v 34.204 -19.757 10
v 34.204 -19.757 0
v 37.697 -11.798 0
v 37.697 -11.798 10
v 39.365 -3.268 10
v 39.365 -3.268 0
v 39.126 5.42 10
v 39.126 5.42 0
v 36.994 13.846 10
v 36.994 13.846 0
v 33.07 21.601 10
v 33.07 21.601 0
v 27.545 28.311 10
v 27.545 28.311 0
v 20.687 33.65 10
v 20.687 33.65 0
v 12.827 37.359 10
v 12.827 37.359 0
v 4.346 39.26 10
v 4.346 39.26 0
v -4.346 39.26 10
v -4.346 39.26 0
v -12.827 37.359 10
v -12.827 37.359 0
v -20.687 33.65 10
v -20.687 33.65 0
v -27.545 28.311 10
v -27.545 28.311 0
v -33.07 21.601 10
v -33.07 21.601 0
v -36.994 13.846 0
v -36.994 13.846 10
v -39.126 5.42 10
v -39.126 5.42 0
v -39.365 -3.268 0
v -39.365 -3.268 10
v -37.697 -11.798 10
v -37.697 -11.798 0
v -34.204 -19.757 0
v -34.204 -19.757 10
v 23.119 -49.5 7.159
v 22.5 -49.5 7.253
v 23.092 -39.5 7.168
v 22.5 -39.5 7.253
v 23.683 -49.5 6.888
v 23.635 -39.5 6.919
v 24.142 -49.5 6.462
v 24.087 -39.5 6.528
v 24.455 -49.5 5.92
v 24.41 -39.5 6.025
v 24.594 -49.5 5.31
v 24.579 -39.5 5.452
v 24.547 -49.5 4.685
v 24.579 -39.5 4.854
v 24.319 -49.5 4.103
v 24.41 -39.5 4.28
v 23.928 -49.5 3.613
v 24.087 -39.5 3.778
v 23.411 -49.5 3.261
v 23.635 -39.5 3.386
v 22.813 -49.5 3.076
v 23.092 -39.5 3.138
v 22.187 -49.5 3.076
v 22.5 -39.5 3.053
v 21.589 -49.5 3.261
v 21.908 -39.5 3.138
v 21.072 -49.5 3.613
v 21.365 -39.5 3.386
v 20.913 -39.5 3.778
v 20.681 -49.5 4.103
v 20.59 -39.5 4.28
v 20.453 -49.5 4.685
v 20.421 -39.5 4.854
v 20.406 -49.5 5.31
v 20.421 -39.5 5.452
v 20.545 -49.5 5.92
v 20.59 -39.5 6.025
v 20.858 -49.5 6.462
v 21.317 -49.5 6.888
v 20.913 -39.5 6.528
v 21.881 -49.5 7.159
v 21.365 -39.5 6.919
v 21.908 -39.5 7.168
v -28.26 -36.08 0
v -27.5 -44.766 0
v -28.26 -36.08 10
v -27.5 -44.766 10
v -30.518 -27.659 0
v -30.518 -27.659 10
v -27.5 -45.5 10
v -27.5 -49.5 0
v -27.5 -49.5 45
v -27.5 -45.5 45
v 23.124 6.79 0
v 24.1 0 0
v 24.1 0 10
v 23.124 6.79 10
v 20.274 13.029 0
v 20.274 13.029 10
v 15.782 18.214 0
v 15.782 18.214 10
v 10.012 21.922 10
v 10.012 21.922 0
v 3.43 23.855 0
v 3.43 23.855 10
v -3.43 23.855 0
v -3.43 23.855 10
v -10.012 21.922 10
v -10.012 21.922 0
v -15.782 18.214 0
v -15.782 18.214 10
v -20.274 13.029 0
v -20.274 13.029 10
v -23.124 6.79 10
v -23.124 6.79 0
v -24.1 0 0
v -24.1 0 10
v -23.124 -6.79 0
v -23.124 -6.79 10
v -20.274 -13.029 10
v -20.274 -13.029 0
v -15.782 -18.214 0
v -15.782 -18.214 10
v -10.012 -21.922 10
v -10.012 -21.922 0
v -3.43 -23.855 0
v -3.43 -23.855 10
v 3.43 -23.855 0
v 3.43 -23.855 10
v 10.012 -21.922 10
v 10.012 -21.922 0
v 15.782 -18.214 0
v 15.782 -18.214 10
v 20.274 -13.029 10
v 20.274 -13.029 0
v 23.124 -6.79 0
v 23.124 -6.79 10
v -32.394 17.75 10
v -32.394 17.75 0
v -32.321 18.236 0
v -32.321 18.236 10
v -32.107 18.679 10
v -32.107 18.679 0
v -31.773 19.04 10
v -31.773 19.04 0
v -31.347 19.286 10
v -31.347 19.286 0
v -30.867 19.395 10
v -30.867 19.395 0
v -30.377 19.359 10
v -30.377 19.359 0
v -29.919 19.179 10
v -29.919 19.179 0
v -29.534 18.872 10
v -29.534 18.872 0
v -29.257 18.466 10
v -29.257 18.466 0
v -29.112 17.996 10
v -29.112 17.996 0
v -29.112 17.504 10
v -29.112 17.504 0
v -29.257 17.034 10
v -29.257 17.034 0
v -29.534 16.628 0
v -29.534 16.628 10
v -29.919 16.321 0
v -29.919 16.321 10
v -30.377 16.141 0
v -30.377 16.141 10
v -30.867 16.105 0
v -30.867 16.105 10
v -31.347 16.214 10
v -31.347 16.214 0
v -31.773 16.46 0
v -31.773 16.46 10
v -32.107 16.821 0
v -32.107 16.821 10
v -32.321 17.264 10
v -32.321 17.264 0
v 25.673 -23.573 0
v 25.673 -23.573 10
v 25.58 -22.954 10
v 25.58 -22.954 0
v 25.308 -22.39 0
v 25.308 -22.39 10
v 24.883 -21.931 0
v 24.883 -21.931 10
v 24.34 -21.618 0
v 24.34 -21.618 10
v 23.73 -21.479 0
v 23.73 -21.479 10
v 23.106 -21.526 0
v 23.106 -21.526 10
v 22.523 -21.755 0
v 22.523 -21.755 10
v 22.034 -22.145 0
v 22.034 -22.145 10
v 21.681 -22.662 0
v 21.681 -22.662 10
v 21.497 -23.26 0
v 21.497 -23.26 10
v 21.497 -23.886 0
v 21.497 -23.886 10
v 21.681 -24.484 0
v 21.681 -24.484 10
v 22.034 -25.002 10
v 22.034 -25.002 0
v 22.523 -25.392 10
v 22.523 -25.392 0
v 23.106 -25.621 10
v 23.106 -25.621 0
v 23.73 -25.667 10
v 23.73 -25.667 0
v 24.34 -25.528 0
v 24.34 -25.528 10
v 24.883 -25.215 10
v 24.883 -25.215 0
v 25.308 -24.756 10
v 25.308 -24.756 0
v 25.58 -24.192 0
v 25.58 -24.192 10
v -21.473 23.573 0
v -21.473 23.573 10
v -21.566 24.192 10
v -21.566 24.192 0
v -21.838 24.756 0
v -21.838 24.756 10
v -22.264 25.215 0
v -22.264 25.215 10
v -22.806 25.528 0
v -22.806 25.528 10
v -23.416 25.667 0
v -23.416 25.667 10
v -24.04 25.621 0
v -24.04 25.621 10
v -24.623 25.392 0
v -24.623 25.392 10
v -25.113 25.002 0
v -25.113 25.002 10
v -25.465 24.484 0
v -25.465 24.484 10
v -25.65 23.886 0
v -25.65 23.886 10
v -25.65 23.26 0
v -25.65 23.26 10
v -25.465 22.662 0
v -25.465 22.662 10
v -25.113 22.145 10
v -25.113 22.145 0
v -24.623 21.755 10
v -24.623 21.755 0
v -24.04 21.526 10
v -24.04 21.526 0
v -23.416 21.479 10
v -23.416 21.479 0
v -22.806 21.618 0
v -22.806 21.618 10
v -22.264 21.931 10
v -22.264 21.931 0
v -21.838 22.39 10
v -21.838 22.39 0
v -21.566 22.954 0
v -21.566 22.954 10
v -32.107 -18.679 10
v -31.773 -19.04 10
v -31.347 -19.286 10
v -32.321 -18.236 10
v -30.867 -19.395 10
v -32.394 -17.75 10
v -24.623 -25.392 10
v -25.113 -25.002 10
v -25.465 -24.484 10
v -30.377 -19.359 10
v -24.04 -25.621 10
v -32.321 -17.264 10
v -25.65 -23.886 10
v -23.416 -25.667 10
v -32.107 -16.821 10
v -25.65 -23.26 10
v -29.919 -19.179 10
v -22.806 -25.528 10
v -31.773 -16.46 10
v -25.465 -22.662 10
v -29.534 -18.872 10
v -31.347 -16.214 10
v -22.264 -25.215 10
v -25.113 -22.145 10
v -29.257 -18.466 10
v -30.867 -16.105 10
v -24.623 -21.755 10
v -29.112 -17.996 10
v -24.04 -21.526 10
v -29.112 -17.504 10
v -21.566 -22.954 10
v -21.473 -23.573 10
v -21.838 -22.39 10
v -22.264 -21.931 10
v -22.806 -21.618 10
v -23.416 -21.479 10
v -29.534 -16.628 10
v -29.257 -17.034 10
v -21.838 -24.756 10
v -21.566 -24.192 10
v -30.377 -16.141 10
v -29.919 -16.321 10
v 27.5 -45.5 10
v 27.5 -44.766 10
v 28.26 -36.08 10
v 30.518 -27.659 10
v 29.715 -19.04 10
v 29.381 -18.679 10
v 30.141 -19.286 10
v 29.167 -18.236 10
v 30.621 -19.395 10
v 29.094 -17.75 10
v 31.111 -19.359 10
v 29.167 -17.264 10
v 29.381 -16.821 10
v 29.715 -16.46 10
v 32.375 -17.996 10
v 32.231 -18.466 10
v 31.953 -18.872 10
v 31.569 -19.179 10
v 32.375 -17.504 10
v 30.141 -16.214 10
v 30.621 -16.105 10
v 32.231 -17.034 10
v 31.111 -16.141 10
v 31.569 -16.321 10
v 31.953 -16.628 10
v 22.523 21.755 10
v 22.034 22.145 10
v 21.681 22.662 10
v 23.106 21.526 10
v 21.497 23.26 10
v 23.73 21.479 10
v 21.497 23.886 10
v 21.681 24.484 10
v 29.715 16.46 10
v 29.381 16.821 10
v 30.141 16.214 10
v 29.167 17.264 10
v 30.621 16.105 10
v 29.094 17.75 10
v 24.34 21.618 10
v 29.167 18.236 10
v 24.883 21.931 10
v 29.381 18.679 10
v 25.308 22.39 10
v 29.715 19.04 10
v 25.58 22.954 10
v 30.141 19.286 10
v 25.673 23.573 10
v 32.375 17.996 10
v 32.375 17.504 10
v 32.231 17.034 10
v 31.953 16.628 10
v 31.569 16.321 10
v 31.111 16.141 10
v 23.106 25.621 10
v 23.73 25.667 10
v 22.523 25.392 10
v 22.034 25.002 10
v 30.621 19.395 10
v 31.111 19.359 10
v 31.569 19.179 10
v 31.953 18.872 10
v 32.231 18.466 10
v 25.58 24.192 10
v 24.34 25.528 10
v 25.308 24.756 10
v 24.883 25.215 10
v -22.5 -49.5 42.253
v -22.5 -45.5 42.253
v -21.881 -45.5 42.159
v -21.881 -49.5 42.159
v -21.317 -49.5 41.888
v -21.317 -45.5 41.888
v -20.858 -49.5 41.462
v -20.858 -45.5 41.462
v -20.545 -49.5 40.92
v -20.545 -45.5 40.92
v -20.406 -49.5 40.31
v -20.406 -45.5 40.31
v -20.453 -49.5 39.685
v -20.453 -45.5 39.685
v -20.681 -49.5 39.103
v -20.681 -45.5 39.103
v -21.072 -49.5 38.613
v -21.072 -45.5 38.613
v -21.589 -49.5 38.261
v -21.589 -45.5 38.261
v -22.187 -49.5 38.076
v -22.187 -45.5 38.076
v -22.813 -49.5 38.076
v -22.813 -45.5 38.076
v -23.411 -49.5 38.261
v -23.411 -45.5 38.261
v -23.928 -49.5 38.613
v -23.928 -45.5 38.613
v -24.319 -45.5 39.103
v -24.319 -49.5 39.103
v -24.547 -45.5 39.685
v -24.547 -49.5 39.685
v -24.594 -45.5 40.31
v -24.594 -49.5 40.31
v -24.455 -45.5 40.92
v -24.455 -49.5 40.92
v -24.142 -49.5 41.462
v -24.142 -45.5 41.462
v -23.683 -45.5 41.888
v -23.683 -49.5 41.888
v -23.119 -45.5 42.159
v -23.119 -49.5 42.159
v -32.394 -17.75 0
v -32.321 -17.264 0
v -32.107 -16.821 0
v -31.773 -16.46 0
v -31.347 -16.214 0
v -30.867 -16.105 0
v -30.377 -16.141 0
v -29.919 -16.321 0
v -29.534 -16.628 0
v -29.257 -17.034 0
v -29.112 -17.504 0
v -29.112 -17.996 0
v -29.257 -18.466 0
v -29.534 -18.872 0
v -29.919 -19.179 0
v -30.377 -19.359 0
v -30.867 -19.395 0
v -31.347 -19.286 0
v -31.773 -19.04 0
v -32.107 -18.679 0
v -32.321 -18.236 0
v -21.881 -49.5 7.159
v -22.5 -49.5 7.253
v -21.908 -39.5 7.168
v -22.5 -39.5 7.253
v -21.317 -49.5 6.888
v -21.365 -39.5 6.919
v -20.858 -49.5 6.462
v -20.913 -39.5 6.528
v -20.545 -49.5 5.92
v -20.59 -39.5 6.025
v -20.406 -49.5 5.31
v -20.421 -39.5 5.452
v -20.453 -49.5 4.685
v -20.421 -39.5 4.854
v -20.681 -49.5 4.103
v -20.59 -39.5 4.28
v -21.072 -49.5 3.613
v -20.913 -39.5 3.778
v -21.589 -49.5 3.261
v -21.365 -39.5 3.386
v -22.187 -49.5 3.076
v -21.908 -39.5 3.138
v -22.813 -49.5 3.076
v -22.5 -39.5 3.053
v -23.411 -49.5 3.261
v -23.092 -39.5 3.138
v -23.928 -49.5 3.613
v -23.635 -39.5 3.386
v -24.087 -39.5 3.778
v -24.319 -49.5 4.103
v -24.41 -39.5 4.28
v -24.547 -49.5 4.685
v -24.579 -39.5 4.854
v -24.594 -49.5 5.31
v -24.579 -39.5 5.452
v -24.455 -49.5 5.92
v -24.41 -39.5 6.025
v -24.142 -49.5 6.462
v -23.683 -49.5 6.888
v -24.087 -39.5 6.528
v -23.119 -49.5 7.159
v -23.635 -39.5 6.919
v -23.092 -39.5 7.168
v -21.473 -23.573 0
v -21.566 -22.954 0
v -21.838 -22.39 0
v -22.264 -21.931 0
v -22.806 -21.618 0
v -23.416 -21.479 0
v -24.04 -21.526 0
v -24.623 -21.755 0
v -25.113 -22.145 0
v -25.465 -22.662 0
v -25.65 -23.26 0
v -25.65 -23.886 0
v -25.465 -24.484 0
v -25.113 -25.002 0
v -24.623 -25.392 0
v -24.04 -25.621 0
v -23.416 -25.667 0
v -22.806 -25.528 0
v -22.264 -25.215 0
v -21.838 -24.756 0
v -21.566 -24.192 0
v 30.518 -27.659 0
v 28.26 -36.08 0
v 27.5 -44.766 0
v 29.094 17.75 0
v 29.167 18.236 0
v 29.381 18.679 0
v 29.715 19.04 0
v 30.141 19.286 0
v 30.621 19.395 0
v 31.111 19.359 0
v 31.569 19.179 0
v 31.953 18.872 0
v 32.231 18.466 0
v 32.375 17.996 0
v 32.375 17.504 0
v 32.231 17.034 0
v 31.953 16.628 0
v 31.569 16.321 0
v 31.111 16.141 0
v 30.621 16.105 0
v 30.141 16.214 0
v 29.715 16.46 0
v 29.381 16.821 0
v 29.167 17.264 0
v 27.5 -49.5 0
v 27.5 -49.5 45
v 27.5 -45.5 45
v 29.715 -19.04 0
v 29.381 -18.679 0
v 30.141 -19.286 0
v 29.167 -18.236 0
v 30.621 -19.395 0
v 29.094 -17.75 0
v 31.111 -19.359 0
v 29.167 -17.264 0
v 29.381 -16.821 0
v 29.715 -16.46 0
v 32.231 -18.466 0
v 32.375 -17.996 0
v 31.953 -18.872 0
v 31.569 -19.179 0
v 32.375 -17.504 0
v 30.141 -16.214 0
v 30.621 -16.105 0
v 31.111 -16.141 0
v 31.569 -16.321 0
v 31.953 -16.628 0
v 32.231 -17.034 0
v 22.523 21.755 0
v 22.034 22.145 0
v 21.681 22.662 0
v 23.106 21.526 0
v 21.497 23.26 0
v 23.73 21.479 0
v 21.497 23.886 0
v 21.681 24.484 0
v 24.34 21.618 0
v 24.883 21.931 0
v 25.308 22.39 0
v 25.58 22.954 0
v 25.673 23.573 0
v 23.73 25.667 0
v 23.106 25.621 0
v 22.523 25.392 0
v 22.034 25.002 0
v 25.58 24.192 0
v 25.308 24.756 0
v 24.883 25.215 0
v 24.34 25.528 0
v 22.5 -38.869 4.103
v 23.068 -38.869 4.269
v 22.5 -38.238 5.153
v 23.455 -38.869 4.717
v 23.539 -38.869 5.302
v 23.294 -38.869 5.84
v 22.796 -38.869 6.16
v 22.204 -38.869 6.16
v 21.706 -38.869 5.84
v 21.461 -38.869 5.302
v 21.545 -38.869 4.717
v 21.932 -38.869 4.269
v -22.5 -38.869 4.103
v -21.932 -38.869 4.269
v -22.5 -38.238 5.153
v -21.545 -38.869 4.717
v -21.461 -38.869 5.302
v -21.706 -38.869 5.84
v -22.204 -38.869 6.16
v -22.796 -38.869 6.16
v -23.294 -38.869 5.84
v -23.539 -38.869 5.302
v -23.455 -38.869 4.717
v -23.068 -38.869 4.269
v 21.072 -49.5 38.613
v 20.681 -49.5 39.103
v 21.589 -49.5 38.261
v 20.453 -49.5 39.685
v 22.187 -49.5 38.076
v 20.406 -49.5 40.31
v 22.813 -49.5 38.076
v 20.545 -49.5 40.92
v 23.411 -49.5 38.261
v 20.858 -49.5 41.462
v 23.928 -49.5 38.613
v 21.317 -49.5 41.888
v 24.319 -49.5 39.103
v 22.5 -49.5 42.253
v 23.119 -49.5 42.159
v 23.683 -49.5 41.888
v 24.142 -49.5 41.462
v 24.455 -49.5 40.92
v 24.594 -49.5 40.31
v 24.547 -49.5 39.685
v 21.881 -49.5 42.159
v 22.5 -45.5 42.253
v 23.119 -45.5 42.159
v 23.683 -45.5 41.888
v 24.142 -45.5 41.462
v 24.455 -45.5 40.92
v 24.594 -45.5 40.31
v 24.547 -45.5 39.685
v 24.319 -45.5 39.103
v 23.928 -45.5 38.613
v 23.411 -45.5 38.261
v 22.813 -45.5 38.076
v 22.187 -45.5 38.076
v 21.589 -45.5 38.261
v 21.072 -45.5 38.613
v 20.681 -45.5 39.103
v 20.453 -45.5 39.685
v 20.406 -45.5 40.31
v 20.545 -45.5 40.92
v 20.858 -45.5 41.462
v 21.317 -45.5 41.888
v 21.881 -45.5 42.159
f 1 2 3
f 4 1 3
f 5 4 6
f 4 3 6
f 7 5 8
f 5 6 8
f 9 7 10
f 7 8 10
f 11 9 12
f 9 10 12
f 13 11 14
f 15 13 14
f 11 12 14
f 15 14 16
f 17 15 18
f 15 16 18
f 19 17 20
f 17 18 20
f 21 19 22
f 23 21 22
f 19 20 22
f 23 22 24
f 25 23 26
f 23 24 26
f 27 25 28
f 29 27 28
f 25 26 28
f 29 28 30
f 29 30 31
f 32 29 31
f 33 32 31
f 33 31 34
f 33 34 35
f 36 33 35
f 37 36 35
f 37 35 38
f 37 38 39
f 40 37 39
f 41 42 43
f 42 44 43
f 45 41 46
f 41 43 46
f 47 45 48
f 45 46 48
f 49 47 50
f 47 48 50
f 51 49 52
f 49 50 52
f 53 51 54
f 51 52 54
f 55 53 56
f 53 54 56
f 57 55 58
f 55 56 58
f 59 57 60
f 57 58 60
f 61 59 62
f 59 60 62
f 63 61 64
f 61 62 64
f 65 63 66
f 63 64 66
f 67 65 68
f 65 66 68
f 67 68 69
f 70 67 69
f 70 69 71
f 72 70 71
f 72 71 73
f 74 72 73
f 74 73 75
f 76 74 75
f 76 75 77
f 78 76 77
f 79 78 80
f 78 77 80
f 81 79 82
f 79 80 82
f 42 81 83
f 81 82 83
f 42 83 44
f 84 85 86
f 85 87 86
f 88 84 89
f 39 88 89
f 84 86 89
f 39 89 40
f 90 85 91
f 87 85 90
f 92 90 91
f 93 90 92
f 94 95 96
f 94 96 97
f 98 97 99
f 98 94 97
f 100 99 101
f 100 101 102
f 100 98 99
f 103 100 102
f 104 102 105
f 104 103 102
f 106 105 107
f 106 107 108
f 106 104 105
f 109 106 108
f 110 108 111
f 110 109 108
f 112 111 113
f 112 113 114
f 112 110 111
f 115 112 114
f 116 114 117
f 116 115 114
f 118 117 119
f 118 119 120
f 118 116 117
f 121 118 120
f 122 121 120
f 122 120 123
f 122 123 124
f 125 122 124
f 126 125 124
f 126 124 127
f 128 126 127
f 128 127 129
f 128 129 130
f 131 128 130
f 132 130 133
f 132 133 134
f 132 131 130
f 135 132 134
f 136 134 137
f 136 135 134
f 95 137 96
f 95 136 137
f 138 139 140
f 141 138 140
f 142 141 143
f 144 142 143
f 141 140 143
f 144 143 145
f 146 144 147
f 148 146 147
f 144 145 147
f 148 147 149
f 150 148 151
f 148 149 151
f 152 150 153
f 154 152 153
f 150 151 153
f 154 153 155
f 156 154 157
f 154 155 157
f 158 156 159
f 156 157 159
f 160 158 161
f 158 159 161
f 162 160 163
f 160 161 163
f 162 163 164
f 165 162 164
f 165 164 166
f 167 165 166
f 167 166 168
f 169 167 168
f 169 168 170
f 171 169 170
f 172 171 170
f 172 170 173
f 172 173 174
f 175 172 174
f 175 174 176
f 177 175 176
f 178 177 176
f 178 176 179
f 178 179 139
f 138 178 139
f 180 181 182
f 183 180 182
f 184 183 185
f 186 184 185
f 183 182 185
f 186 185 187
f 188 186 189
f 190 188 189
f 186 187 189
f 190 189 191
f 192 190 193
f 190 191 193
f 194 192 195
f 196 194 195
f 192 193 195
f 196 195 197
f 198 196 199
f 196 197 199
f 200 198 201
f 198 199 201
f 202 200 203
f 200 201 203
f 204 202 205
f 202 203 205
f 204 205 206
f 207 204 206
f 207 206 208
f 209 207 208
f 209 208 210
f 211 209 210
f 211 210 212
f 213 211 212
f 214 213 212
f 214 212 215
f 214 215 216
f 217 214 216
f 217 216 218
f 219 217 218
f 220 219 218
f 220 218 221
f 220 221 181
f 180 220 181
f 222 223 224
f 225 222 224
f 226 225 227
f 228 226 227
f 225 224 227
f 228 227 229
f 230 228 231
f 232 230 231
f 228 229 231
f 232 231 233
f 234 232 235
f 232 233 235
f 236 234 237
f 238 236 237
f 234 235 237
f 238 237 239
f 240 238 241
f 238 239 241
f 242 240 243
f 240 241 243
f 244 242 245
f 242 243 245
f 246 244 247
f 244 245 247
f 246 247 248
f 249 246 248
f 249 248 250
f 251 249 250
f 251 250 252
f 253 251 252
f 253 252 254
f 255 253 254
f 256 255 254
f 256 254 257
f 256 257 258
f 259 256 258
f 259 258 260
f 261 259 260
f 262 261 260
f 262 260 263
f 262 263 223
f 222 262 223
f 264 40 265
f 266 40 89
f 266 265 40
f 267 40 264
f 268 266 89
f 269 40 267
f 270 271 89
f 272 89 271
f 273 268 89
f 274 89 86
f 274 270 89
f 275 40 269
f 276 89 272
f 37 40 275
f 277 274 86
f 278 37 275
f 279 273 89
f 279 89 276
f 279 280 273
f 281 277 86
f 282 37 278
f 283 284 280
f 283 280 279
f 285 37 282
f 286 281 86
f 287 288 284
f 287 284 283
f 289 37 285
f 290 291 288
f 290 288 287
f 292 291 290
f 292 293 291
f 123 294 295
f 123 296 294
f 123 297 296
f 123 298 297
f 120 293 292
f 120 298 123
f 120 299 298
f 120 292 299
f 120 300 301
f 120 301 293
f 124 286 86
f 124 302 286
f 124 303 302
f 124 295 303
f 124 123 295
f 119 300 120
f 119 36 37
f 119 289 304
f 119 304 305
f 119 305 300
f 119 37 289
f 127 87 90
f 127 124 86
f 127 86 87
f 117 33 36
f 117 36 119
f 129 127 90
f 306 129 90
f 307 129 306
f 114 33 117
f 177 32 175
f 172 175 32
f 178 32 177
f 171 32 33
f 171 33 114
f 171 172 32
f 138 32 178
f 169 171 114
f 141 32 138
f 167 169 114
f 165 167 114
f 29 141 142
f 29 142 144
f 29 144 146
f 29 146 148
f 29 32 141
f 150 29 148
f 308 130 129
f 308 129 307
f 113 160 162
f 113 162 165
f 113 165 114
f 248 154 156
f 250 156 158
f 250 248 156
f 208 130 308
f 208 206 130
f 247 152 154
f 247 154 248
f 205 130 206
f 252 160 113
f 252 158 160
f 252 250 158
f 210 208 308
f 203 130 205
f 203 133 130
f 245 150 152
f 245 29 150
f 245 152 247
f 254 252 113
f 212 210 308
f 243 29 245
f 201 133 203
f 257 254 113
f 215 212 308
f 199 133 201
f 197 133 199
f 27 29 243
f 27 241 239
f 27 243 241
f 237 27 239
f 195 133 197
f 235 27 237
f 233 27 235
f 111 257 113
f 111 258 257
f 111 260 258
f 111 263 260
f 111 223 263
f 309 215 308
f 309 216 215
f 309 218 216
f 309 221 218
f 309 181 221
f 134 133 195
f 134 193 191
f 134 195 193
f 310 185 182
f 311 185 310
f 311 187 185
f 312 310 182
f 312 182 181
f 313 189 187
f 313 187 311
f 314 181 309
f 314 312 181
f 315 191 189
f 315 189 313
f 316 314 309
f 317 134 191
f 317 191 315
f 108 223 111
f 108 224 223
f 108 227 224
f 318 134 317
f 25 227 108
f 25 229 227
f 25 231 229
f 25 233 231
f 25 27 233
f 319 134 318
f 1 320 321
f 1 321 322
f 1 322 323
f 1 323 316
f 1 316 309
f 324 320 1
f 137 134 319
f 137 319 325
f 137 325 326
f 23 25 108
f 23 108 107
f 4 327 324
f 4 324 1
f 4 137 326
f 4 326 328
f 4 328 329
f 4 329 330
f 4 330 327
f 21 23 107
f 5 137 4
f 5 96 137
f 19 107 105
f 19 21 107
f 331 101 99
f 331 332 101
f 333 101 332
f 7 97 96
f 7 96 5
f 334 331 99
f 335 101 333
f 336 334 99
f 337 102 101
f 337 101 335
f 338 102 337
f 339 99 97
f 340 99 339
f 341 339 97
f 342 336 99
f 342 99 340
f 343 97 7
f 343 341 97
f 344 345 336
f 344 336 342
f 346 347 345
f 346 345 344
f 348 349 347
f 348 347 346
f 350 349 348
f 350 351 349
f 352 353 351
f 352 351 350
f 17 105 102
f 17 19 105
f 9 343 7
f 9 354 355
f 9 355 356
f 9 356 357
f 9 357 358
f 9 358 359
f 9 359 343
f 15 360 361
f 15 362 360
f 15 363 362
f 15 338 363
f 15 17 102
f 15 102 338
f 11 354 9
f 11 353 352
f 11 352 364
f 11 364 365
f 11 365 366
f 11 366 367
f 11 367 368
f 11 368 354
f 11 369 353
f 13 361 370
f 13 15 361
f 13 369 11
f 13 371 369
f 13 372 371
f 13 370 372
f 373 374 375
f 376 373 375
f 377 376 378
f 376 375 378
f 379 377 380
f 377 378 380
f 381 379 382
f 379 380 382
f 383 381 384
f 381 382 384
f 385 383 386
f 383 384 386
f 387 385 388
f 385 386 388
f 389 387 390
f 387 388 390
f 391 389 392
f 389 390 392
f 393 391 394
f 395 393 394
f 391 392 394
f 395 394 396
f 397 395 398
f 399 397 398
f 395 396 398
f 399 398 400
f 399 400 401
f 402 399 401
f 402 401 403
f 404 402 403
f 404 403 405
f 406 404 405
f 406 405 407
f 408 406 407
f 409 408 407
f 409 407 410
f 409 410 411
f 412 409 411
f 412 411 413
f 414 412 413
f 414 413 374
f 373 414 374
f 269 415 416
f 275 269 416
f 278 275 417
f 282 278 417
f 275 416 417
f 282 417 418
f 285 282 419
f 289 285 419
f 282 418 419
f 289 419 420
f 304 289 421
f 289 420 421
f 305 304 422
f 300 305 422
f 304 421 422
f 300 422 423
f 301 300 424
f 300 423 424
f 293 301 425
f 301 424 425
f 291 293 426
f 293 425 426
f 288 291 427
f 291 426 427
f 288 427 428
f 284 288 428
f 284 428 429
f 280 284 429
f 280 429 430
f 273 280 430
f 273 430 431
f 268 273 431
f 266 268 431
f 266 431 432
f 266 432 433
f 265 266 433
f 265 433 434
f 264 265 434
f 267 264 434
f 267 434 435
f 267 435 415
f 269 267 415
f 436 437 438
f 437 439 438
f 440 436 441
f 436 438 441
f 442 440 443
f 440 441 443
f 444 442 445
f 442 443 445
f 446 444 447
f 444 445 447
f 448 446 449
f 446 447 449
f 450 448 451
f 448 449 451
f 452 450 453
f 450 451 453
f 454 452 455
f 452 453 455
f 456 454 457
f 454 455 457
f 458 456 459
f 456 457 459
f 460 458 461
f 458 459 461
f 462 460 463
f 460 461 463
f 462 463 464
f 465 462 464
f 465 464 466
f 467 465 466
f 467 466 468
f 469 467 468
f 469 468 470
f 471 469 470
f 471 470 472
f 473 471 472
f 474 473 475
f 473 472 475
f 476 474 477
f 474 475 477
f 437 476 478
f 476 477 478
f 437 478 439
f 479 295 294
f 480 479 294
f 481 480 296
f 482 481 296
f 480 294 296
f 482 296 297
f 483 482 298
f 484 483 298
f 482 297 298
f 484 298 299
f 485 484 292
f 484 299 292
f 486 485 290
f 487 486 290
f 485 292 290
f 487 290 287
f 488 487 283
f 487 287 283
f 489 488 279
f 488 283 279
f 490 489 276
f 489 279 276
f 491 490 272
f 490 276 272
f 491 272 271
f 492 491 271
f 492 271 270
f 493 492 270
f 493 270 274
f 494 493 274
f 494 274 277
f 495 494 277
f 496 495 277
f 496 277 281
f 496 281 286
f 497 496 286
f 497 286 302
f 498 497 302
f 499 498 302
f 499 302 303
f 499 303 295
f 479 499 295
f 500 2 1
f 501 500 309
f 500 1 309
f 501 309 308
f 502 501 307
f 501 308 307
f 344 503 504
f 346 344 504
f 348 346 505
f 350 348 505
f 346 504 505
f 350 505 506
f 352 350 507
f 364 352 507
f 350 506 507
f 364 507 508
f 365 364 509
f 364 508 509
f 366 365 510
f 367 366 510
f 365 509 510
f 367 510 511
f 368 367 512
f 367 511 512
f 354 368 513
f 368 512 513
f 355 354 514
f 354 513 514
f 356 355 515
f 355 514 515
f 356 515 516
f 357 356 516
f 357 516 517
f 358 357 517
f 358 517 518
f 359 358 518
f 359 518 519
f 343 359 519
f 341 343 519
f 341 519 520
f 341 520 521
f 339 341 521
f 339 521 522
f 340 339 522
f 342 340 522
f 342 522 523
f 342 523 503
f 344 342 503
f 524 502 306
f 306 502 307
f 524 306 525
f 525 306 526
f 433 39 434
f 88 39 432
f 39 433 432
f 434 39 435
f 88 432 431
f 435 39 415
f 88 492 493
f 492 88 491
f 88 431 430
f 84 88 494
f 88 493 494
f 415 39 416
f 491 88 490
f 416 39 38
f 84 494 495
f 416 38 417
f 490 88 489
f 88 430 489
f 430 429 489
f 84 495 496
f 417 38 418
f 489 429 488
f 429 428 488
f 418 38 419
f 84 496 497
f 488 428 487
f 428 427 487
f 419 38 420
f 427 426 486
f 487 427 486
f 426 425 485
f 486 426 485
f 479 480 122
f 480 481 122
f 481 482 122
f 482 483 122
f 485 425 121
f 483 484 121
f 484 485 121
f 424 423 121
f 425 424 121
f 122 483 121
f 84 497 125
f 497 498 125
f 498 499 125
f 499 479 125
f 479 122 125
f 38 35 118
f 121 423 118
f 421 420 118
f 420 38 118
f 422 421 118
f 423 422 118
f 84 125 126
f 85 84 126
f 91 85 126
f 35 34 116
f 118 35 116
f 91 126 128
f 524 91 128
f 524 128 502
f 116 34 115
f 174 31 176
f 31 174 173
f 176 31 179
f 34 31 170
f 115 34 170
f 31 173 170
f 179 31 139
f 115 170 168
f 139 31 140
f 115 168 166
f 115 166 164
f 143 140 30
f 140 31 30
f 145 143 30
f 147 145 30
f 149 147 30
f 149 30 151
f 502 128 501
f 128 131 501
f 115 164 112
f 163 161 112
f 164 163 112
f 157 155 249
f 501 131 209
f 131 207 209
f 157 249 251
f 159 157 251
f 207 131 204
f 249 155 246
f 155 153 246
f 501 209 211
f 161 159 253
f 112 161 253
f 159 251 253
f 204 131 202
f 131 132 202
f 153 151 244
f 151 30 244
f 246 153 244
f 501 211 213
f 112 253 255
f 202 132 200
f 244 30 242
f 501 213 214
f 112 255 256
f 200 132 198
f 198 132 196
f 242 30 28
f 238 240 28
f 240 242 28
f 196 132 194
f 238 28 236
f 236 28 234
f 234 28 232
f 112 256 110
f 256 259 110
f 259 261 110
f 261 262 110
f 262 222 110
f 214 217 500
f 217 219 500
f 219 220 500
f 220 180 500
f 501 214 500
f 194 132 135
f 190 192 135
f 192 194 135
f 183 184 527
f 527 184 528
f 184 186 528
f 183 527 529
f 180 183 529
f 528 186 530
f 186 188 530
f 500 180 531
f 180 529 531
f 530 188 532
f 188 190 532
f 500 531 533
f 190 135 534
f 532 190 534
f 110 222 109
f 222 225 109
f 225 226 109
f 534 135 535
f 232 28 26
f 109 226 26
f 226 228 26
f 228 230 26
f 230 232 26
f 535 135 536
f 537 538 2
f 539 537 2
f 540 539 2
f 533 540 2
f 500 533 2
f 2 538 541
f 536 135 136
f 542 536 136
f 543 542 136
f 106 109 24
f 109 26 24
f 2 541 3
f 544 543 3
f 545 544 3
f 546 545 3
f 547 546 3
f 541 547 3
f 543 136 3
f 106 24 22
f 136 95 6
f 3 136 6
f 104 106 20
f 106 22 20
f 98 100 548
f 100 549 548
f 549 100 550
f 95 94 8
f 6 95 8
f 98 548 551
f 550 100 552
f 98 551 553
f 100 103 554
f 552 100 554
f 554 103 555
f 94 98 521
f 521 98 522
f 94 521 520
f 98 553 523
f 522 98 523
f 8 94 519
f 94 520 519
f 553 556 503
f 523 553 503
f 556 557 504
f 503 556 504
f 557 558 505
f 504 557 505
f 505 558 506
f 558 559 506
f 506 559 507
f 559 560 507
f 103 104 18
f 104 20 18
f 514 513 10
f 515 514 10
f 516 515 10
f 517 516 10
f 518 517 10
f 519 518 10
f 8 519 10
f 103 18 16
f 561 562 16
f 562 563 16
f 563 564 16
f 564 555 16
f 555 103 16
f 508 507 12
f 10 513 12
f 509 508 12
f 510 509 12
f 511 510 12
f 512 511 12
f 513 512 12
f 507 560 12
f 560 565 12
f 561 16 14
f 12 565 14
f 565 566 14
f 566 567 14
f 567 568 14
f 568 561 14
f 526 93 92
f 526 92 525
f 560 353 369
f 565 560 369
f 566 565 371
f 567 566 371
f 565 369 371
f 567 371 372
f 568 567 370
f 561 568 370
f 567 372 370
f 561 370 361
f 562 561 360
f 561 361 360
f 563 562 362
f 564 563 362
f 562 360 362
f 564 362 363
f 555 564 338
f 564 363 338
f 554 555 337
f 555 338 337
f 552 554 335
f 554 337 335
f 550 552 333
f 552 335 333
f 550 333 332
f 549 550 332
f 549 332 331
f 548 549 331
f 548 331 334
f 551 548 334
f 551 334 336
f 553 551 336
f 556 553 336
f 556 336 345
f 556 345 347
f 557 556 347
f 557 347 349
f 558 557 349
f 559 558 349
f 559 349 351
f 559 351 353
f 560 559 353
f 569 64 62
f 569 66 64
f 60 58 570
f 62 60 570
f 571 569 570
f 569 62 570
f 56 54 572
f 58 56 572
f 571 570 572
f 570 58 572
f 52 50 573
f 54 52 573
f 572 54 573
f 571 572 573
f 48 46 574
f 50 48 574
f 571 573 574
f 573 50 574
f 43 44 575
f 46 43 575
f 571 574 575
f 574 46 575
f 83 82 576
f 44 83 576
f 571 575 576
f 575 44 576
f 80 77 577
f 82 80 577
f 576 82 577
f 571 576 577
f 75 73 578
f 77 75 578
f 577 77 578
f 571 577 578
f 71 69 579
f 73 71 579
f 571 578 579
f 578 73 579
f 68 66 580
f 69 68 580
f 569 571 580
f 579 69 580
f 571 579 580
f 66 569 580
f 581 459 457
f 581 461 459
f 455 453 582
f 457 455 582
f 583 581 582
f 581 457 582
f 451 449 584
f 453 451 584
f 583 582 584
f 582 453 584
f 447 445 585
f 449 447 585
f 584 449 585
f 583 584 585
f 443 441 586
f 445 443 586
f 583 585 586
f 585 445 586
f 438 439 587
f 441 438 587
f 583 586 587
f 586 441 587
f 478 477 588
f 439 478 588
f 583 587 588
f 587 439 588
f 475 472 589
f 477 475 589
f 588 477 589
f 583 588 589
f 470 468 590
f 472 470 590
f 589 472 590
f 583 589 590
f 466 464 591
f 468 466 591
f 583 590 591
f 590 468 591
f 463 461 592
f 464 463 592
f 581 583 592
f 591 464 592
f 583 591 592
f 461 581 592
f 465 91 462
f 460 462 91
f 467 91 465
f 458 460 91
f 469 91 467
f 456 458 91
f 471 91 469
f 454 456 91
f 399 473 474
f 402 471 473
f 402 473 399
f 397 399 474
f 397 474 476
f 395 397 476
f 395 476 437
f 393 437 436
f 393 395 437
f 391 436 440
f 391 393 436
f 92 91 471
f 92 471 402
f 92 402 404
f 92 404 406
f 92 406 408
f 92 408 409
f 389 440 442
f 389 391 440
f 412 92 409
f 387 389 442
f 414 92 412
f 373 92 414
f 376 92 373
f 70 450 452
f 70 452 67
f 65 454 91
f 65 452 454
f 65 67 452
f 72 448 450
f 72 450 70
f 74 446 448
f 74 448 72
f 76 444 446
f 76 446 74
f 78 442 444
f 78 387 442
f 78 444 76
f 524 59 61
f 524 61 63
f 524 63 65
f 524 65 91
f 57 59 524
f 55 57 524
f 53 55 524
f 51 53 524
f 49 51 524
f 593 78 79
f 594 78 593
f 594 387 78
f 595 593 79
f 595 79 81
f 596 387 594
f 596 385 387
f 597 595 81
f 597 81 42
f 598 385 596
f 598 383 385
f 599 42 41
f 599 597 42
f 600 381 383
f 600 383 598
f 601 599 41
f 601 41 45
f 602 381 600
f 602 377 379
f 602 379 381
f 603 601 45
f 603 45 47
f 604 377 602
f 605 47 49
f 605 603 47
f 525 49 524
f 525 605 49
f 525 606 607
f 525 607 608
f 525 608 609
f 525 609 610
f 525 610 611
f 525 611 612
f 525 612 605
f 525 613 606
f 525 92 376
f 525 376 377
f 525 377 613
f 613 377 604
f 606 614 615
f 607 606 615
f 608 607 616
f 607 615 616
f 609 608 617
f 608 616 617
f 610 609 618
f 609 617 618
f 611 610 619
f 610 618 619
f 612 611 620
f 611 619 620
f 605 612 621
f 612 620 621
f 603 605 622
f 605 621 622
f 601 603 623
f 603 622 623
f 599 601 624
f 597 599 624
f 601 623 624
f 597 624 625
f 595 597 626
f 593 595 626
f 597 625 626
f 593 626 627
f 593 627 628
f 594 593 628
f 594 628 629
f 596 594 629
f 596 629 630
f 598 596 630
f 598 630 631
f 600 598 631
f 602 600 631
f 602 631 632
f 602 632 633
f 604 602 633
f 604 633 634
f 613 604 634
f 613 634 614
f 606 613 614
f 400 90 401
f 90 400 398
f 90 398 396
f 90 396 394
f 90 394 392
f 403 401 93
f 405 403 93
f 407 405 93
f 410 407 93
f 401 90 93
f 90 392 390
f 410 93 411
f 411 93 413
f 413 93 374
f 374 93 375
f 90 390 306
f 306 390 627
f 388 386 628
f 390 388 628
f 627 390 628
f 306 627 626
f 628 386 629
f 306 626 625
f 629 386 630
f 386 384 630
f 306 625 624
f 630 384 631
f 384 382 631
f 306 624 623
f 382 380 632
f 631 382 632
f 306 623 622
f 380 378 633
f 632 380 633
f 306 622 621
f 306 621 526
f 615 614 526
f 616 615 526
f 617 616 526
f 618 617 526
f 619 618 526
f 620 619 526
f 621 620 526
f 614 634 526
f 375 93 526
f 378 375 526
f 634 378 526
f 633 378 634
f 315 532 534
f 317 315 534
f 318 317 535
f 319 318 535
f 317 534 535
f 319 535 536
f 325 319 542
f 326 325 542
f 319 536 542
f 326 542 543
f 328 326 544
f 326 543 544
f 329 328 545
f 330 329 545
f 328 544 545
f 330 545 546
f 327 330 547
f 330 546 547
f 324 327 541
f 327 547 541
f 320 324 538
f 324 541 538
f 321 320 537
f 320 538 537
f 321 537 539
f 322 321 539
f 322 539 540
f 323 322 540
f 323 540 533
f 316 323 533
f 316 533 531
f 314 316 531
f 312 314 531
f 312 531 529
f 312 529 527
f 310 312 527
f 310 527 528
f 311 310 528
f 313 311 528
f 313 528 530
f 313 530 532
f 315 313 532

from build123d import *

# Parameters (mm, degrees)
SKETCH1_R                       = 24.1
BOSS_EXTRUDE1_DEPTH             = 10
TAP_DRILL_FOR_M5X0_8_TAP1_D     = 4.2
TAP_DRILL_FOR_M4X0_7_TAP1_D     = 3.3
SKETCH9_W                       = 55
SKETCH9_H                       = 45
BOSS_EXTRUDE2_DEPTH             = 4
TAP_DRILL_FOR_M5X0_8_TAP2_D     = 4.2
TAP_DRILL_FOR_M5X0_8_TAP2_DEPTH = 10
TAP_DRILL_FOR_M5X0_8_TAP2_TIP   = 1.2618073
FILLET1_R                       = 50


with BuildPart() as part:
    # Sketch1 → Boss-Extrude1 (new body)
    with BuildSketch(Plane.XY):
        with BuildLine():
            Line((-27.5, -28.354893758), (-27.5, -45.5))
            Line((-27.5, -45.5), (27.5, -45.5))
            Line((27.5, -45.5), (27.5, -28.354893758))
            ThreePointArc((27.5, -28.354893758), (0, 39.5), (-27.5, -28.354893758))
        make_face()
        Circle(SKETCH1_R, mode=Mode.SUBTRACT)
    extrude(amount=BOSS_EXTRUDE1_DEPTH)

    # Tap Drill for M5x0.8 Tap1 (through all)
    with Locations(Plane(origin=(23.573172318, 23.573172318, 0), x_dir=(-1, 0, 0), z_dir=(0, 0, -1))):
        with Locations((0, 0), (47.146344636, 0), (47.146344636, -47.146344636), (0, -47.146344636)):
            Hole(TAP_DRILL_FOR_M5X0_8_TAP1_D / 2)

    # Tap Drill for M4x0.7 Tap1 (through all)
    with Locations(Plane(origin=(-30.743901834, -17.75, 10), x_dir=(1, 0, 0), z_dir=(0, 0, 1))):
        with Locations((0, 0), (0, 35.5), (61.487803668, 35.5), (61.487803668, 0)):
            Hole(TAP_DRILL_FOR_M4X0_7_TAP1_D / 2)

    # Sketch9 → Boss-Extrude2 (add)
    with BuildSketch(Plane.XZ.offset(45.5)):
        with Locations((0, 22.5)):
            Rectangle(SKETCH9_W, SKETCH9_H)
    extrude(amount=BOSS_EXTRUDE2_DEPTH)

    # Tap Drill for M5x0.8 Tap2
    with Locations(Plane(origin=(-22.5, -49.5, 40.15274255), x_dir=(0, 0, -1), z_dir=(0, -1, 0))):
        with Locations((0, 0), (0, 45), (35, 45), (35, 0)):
            Hole(TAP_DRILL_FOR_M5X0_8_TAP2_D / 2, depth=TAP_DRILL_FOR_M5X0_8_TAP2_DEPTH)
            with Locations((0, 0, -(TAP_DRILL_FOR_M5X0_8_TAP2_DEPTH + TAP_DRILL_FOR_M5X0_8_TAP2_TIP / 2))):  # 118° drill point
                Cone(0, TAP_DRILL_FOR_M5X0_8_TAP2_D / 2, TAP_DRILL_FOR_M5X0_8_TAP2_TIP, mode=Mode.SUBTRACT)

    # Fillet1
    fillet1_edges = [part.edges().sort_by_distance(p)[0] for p in [
        (-27.5, -28.354893758, 5),
        (27.5, -28.354893758, 5),
    ]]
    fillet(fillet1_edges, radius=FILLET1_R)


solid = part.part
